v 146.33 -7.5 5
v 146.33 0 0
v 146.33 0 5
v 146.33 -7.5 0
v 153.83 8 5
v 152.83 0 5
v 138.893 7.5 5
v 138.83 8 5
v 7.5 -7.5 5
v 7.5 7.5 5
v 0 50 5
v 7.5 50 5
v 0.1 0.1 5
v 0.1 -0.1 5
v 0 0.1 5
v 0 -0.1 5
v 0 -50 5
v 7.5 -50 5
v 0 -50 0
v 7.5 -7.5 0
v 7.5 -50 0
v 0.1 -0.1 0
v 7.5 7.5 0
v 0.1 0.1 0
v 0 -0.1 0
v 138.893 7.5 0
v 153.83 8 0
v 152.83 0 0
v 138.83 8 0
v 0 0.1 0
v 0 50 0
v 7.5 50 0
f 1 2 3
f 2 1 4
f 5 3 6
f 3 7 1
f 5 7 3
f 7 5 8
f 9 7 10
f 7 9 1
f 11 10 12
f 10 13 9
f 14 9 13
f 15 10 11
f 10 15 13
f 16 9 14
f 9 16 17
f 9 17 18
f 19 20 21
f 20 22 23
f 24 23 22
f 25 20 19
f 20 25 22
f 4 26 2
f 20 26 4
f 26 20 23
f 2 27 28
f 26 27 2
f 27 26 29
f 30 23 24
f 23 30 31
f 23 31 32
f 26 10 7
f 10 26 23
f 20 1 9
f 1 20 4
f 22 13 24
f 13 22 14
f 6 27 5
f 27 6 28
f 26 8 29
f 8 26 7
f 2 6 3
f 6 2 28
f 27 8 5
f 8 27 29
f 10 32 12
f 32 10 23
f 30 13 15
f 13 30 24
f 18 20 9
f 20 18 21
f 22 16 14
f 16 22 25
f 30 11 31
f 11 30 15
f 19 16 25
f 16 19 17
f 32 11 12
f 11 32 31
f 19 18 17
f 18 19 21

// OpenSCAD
// file: ../src/model_a_cross_brace.scad
// ============================================
// PiCanvas - 모델 A: 십자 보강재
// ============================================

// --- 공통 파라미터 (center_bracket과 동일) ---
bracket_size = 70;
bracket_thickness = 5;

// LCD 디스플레이
lcd_w = 350.66;
lcd_h = 216.25;
lcd_d = 3.2;

// 프레임
frame_bezel = 3;        // 전면 오버랩
frame_wall = 6;         // 프레임 벽 두께
frame_inner_w = lcd_w;
frame_inner_h = lcd_h;
frame_outer_w = lcd_w + frame_wall * 2;
frame_outer_h = lcd_h + frame_wall * 2;

// 십자 보강재
cross_bar_width = 15;     // 바 너비
cross_bar_thickness = bracket_thickness;  // 브라켓과 동일 두께

// 도브테일 파라미터 (center_bracket과 맞춤)
dt_width = 15;
dt_depth = 8;
dt_taper = 1;  // 사다리꼴 기울기

// --- 모듈 ---

// 도브테일 암 (center_bracket 쪽 연결)
module dovetail_female(height) {
    clearance = 0.2;  // 끼워맞춤 여유
    linear_extrude(height = height)
        polygon([
            [-(dt_width/2 - dt_taper) - clearance, 0],
            [(dt_width/2 - dt_taper) + clearance, 0],
            [dt_width/2 + clearance, dt_depth + clearance],
            [-dt_width/2 - clearance, dt_depth + clearance]
        ]);
}

// 프레임 연결용 도브테일 수 (끝단)
module dovetail_male_end() {
    linear_extrude(height = cross_bar_thickness)
        polygon([
            [-dt_width/2 + dt_taper, 0],
            [dt_width/2 - dt_taper, 0],
            [dt_width/2, dt_depth],
            [-dt_width/2, dt_depth]
        ]);
}

// 수평 바 (좌우, X축 방향)
module horizontal_bar() {
    bar_length_half = frame_outer_w / 2 - bracket_size / 2;

    // 오른쪽 바
    module half_bar() {
        difference() {
            translate([0, -cross_bar_width/2, 0])
                cube([bar_length_half, cross_bar_width, cross_bar_thickness]);

            // 중앙 브라켓 도브테일 암 (빼기)
            translate([0, 0, 0])
                rotate([0, 0, -90])
                    translate([-dt_width/2 - 0.1, -dt_depth - 0.1, -0.5])
                        cube([dt_width + 0.2, dt_depth + 0.2, cross_bar_thickness + 1]);
        }

        // 프레임 연결 도브테일 (끝단)
        translate([bar_length_half, 0, 0])
            dovetail_male_end();
    }

    // 오른쪽
    half_bar();

    // 왼쪽 (미러)
    mirror([1, 0, 0])
        half_bar();
}

// 수직 바 (상하, Y축 방향)
module vertical_bar() {
    bar_length_half = frame_outer_h / 2 - bracket_size / 2;

    module half_bar() {
        difference() {
            translate([-cross_bar_width/2, 0, 0])
                cube([cross_bar_width, bar_length_half, cross_bar_thickness]);

            // 중앙 브라켓 도브테일 암 (빼기)
            translate([0, 0, 0])
                rotate([0, 0, 0])
                    translate([-dt_width/2 - 0.1, -dt_depth - 0.1, -0.5])
                        cube([dt_width + 0.2, dt_depth + 0.2, cross_bar_thickness + 1]);
        }

        // 프레임 연결 도브테일 (끝단)
        translate([0, bar_length_half, 0])
            rotate([0, 0, 90])
                dovetail_male_end();
    }

    // 위쪽
    half_bar();

    // 아래쪽 (미러)
    mirror([0, 1, 0])
        half_bar();
}

// --- 메인 ---

module model_a_cross_brace() {
    color("CadetBlue") {
        horizontal_bar();
        vertical_bar();
    }
}

model_a_cross_brace();

// 디버그: 중앙 브라켓 외형 (투명)
%translate([-bracket_size/2, -bracket_size/2, 0])
    cube([bracket_size, bracket_size, bracket_thickness]);

// 디버그: 프레임 외형 (투명)
%translate([-frame_outer_w/2, -frame_outer_h/2, 0])
    difference() {
        cube([frame_outer_w, frame_outer_h, 1]);
        translate([frame_wall, frame_wall, -0.5])
            cube([frame_inner_w, frame_inner_h, 2]);
    }
// main file
// ============================================
// Plate 2: 십자 보강재 - 수평 우측 반쪽
// 크기: ~146 x 15 mm (OK)
// ============================================
use <../src/model_a_cross_brace.scad>

// 수평바 우측 반쪽만 추출
lcd_w = 350.66;
frame_wall = 6;
frame_outer_w = lcd_w + frame_wall * 2;
bracket_size = 70;
bar_len = frame_outer_w / 2 - bracket_size / 2;

intersection() {
    model_a_cross_brace();
    translate([0, -50, -1])
        cube([frame_outer_w, 100, 20]);
}
